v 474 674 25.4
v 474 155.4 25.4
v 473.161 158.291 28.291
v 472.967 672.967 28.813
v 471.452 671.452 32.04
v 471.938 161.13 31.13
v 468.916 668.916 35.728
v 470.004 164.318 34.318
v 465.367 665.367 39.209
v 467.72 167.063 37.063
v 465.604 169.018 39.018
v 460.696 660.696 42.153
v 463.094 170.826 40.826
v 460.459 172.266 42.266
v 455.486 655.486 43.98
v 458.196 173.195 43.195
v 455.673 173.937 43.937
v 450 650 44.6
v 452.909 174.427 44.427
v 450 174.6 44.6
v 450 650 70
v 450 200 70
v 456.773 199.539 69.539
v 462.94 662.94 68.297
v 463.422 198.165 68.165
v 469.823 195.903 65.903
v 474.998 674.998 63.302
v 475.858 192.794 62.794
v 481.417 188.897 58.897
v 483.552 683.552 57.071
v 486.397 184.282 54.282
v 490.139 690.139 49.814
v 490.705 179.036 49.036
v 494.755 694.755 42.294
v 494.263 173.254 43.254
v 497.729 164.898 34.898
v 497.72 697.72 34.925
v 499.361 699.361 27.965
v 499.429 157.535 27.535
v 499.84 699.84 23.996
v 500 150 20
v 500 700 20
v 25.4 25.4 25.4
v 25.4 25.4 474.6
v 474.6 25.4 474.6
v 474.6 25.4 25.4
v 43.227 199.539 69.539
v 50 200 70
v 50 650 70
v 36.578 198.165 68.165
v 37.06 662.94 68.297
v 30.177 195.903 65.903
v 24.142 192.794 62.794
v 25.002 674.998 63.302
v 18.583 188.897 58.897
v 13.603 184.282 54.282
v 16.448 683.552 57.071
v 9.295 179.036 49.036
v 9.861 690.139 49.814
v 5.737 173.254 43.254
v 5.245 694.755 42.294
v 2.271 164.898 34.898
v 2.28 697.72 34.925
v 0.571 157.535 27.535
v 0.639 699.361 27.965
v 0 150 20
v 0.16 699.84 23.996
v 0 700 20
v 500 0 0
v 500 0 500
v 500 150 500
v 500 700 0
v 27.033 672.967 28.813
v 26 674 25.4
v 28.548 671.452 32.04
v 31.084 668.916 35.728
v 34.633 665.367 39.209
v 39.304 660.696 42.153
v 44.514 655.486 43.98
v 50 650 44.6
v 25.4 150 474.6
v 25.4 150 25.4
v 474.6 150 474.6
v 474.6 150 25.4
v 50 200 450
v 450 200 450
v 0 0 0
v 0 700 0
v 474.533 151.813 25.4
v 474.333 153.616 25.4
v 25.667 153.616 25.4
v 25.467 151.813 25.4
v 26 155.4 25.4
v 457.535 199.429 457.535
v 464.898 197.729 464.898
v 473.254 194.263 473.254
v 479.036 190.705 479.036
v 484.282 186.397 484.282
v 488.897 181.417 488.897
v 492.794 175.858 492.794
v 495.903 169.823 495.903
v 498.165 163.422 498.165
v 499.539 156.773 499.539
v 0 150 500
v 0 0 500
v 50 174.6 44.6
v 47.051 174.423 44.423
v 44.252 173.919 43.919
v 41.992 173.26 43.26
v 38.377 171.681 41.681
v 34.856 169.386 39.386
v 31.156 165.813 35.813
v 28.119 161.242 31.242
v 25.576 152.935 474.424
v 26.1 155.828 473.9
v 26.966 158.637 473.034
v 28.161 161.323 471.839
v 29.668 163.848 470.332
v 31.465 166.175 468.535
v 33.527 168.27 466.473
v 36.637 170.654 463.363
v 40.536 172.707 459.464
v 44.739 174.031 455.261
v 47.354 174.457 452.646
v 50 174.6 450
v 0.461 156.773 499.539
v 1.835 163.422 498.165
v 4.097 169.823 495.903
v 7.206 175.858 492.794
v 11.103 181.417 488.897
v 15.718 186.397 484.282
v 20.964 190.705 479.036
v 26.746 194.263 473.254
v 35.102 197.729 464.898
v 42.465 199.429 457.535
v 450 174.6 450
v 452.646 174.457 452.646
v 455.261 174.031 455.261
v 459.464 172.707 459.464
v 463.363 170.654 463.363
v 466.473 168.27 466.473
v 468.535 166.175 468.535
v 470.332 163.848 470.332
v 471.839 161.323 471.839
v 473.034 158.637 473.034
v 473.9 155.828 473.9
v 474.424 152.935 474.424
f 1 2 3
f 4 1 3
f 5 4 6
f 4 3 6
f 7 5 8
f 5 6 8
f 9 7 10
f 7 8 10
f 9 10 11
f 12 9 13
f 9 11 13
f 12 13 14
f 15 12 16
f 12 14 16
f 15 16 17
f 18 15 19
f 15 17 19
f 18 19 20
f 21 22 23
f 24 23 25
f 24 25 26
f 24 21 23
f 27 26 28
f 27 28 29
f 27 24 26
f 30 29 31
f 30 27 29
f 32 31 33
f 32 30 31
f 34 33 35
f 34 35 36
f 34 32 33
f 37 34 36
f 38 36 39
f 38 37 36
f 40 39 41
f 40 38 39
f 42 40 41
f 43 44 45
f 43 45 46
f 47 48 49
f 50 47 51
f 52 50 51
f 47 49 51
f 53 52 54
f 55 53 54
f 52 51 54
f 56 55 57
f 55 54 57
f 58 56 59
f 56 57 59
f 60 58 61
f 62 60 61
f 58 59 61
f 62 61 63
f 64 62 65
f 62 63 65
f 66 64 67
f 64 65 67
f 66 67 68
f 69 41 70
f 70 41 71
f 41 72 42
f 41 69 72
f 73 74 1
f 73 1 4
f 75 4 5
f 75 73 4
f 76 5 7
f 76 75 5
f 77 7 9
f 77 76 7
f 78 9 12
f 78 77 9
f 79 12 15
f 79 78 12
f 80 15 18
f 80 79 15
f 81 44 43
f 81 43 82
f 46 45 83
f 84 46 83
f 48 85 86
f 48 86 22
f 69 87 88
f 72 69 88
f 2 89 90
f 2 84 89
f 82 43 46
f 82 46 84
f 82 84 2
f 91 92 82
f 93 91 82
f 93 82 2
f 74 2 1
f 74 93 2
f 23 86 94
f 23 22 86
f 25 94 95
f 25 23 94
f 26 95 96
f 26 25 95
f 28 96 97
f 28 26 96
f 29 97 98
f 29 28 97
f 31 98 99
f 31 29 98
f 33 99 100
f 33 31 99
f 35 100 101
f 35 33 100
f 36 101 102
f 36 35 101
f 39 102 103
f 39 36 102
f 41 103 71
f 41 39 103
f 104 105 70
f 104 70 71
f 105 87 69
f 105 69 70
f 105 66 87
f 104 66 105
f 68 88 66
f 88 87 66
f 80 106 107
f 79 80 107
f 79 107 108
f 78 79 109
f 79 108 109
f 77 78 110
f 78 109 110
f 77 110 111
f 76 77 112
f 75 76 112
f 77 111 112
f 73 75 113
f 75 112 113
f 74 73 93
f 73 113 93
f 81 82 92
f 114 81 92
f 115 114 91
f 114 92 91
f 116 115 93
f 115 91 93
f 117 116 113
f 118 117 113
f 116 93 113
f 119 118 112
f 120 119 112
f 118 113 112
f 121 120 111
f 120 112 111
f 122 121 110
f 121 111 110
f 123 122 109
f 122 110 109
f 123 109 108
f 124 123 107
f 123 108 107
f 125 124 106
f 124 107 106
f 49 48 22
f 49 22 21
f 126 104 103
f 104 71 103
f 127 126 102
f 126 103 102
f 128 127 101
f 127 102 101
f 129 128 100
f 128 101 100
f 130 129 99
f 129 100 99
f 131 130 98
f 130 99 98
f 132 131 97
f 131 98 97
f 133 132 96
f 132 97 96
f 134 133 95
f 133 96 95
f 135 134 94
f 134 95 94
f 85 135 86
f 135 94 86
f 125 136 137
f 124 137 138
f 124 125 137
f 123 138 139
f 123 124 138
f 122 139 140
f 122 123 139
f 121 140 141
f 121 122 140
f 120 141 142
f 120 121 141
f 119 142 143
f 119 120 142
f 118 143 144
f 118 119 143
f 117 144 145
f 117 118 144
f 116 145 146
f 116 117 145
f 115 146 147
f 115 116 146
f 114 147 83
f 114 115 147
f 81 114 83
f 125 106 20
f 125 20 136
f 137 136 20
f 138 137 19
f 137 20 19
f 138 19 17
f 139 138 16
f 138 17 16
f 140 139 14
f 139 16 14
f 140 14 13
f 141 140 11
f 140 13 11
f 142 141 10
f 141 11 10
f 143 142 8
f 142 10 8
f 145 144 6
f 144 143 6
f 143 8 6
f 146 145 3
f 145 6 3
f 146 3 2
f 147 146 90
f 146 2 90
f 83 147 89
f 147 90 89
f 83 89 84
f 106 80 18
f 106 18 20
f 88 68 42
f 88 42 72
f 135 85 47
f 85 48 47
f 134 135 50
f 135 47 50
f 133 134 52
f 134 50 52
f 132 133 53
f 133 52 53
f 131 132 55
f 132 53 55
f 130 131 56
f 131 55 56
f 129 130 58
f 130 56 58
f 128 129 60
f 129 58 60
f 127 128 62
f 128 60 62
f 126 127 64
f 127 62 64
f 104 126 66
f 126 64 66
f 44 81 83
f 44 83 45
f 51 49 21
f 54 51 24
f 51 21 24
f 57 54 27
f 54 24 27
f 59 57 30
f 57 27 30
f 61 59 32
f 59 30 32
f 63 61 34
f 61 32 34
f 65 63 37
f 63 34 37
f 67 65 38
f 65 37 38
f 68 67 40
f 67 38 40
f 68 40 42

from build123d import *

# Parameters (mm, degrees)
BOSS_EXTRUDE1_DEPTH = 500
FILLET1_R           = 50
SHELL1_START        = 25.4
SHELL1_DEPTH        = 449.2
SHELL1_START_2      = 24
SHELL1_2_DEPTH      = 452
SHELL1_START_3      = 154
SHELL1_3_DEPTH      = 20.6
SHELL1_START_4      = 174.6
SHELL1_4_DEPTH      = 500.4


with BuildPart() as part:
    # Sketch1 → Boss-Extrude1 (new body)
    with BuildSketch(Plane(origin=(0, 0, 0), x_dir=(0, 0, -1), z_dir=(1, 0, 0))):
        Polygon((0, 0), (-500, 0), (-500, 200), (-70, 200), (-70, 700), (0, 700), (0, 41.235294118), align=None)
    extrude(amount=BOSS_EXTRUDE1_DEPTH)

    # Fillet1
    fillet1_edges = [part.edges().sort_by_distance(p)[0] for p in [
        (250, 200, 500),
        (250, 700, 70),
        (500, 450, 70),
        (500, 200, 285),
        (0, 200, 285),
        (0, 450, 70),
    ]]
    fillet(fillet1_edges, radius=FILLET1_R)

    # Shell1: read off the stored shape, not the designer's step
    # Shell1 outline → Shell1 (cut)
    with BuildSketch(Plane.YZ.offset(SHELL1_START)):
        with BuildLine():
            Line((25.4, 25.4), (674, 25.4))
            ThreePointArc((674, 25.4), (665.36749817, 39.209372712), (650, 44.6))
            Line((650, 44.6), (174.6, 44.6))
            Line((174.6, 44.6), (174.6, 450))
            ThreePointArc((174.6, 450), (167.394826817, 467.394826817), (150, 474.6))
            Line((150, 474.6), (25.4, 474.6))
            Line((25.4, 474.6), (25.4, 25.4))
        make_face()
    extrude(amount=SHELL1_DEPTH, mode=Mode.SUBTRACT)

    # Shell1 2 outline → Shell1 2 (add)
    with BuildSketch(Plane.XY.offset(SHELL1_START_2)):
        with BuildLine():
            ThreePointArc((25.4, 150), (32.605173183, 167.394826817), (50, 174.6))
            Line((50, 174.6), (25.4, 174.6))
            Line((25.4, 174.6), (25.4, 150))
        make_face()
        with BuildLine():
            ThreePointArc((450, 174.6), (467.394826817, 167.394826817), (474.6, 150))
            Line((474.6, 150), (474.6, 174.6))
            Line((474.6, 174.6), (450, 174.6))
        make_face()
    extrude(amount=SHELL1_2_DEPTH)

    # Shell1 3 outline → Shell1 3 (cut)
    with BuildSketch(Plane(origin=(0, 0, 0), x_dir=(1, 0, 0), z_dir=(0, 1, 0)).offset(SHELL1_START_3)):
        with BuildLine():
            ThreePointArc((450, -44.6), (465.36749817, -39.209372712), (474, -25.4))
            Line((474, -25.4), (26, -25.4))
            ThreePointArc((26, -25.4), (34.63250183, -39.209372712), (50, -44.6))
            Line((50, -44.6), (450, -44.6))
        make_face()
    extrude(amount=SHELL1_3_DEPTH, mode=Mode.SUBTRACT)

    # Shell1 4 outline → Shell1 4 (add)
    with BuildSketch(Plane(origin=(0, 0, 0), x_dir=(1, 0, 0), z_dir=(0, 1, 0)).offset(SHELL1_START_4)):
        with BuildLine():
            Line((474.6, -25.4), (474, -25.4))
            ThreePointArc((474, -25.4), (465.36749817, -39.209372712), (450, -44.6))
            Line((450, -44.6), (474.6, -44.6))
            Line((474.6, -44.6), (474.6, -25.4))
        make_face()
        with BuildLine():
            ThreePointArc((50, -44.6), (34.63250183, -39.209372712), (26, -25.4))
            Line((26, -25.4), (25.4, -25.4))
            Line((25.4, -25.4), (25.4, -44.6))
            Line((25.4, -44.6), (50, -44.6))
        make_face()
    extrude(amount=SHELL1_4_DEPTH)


solid = part.part
